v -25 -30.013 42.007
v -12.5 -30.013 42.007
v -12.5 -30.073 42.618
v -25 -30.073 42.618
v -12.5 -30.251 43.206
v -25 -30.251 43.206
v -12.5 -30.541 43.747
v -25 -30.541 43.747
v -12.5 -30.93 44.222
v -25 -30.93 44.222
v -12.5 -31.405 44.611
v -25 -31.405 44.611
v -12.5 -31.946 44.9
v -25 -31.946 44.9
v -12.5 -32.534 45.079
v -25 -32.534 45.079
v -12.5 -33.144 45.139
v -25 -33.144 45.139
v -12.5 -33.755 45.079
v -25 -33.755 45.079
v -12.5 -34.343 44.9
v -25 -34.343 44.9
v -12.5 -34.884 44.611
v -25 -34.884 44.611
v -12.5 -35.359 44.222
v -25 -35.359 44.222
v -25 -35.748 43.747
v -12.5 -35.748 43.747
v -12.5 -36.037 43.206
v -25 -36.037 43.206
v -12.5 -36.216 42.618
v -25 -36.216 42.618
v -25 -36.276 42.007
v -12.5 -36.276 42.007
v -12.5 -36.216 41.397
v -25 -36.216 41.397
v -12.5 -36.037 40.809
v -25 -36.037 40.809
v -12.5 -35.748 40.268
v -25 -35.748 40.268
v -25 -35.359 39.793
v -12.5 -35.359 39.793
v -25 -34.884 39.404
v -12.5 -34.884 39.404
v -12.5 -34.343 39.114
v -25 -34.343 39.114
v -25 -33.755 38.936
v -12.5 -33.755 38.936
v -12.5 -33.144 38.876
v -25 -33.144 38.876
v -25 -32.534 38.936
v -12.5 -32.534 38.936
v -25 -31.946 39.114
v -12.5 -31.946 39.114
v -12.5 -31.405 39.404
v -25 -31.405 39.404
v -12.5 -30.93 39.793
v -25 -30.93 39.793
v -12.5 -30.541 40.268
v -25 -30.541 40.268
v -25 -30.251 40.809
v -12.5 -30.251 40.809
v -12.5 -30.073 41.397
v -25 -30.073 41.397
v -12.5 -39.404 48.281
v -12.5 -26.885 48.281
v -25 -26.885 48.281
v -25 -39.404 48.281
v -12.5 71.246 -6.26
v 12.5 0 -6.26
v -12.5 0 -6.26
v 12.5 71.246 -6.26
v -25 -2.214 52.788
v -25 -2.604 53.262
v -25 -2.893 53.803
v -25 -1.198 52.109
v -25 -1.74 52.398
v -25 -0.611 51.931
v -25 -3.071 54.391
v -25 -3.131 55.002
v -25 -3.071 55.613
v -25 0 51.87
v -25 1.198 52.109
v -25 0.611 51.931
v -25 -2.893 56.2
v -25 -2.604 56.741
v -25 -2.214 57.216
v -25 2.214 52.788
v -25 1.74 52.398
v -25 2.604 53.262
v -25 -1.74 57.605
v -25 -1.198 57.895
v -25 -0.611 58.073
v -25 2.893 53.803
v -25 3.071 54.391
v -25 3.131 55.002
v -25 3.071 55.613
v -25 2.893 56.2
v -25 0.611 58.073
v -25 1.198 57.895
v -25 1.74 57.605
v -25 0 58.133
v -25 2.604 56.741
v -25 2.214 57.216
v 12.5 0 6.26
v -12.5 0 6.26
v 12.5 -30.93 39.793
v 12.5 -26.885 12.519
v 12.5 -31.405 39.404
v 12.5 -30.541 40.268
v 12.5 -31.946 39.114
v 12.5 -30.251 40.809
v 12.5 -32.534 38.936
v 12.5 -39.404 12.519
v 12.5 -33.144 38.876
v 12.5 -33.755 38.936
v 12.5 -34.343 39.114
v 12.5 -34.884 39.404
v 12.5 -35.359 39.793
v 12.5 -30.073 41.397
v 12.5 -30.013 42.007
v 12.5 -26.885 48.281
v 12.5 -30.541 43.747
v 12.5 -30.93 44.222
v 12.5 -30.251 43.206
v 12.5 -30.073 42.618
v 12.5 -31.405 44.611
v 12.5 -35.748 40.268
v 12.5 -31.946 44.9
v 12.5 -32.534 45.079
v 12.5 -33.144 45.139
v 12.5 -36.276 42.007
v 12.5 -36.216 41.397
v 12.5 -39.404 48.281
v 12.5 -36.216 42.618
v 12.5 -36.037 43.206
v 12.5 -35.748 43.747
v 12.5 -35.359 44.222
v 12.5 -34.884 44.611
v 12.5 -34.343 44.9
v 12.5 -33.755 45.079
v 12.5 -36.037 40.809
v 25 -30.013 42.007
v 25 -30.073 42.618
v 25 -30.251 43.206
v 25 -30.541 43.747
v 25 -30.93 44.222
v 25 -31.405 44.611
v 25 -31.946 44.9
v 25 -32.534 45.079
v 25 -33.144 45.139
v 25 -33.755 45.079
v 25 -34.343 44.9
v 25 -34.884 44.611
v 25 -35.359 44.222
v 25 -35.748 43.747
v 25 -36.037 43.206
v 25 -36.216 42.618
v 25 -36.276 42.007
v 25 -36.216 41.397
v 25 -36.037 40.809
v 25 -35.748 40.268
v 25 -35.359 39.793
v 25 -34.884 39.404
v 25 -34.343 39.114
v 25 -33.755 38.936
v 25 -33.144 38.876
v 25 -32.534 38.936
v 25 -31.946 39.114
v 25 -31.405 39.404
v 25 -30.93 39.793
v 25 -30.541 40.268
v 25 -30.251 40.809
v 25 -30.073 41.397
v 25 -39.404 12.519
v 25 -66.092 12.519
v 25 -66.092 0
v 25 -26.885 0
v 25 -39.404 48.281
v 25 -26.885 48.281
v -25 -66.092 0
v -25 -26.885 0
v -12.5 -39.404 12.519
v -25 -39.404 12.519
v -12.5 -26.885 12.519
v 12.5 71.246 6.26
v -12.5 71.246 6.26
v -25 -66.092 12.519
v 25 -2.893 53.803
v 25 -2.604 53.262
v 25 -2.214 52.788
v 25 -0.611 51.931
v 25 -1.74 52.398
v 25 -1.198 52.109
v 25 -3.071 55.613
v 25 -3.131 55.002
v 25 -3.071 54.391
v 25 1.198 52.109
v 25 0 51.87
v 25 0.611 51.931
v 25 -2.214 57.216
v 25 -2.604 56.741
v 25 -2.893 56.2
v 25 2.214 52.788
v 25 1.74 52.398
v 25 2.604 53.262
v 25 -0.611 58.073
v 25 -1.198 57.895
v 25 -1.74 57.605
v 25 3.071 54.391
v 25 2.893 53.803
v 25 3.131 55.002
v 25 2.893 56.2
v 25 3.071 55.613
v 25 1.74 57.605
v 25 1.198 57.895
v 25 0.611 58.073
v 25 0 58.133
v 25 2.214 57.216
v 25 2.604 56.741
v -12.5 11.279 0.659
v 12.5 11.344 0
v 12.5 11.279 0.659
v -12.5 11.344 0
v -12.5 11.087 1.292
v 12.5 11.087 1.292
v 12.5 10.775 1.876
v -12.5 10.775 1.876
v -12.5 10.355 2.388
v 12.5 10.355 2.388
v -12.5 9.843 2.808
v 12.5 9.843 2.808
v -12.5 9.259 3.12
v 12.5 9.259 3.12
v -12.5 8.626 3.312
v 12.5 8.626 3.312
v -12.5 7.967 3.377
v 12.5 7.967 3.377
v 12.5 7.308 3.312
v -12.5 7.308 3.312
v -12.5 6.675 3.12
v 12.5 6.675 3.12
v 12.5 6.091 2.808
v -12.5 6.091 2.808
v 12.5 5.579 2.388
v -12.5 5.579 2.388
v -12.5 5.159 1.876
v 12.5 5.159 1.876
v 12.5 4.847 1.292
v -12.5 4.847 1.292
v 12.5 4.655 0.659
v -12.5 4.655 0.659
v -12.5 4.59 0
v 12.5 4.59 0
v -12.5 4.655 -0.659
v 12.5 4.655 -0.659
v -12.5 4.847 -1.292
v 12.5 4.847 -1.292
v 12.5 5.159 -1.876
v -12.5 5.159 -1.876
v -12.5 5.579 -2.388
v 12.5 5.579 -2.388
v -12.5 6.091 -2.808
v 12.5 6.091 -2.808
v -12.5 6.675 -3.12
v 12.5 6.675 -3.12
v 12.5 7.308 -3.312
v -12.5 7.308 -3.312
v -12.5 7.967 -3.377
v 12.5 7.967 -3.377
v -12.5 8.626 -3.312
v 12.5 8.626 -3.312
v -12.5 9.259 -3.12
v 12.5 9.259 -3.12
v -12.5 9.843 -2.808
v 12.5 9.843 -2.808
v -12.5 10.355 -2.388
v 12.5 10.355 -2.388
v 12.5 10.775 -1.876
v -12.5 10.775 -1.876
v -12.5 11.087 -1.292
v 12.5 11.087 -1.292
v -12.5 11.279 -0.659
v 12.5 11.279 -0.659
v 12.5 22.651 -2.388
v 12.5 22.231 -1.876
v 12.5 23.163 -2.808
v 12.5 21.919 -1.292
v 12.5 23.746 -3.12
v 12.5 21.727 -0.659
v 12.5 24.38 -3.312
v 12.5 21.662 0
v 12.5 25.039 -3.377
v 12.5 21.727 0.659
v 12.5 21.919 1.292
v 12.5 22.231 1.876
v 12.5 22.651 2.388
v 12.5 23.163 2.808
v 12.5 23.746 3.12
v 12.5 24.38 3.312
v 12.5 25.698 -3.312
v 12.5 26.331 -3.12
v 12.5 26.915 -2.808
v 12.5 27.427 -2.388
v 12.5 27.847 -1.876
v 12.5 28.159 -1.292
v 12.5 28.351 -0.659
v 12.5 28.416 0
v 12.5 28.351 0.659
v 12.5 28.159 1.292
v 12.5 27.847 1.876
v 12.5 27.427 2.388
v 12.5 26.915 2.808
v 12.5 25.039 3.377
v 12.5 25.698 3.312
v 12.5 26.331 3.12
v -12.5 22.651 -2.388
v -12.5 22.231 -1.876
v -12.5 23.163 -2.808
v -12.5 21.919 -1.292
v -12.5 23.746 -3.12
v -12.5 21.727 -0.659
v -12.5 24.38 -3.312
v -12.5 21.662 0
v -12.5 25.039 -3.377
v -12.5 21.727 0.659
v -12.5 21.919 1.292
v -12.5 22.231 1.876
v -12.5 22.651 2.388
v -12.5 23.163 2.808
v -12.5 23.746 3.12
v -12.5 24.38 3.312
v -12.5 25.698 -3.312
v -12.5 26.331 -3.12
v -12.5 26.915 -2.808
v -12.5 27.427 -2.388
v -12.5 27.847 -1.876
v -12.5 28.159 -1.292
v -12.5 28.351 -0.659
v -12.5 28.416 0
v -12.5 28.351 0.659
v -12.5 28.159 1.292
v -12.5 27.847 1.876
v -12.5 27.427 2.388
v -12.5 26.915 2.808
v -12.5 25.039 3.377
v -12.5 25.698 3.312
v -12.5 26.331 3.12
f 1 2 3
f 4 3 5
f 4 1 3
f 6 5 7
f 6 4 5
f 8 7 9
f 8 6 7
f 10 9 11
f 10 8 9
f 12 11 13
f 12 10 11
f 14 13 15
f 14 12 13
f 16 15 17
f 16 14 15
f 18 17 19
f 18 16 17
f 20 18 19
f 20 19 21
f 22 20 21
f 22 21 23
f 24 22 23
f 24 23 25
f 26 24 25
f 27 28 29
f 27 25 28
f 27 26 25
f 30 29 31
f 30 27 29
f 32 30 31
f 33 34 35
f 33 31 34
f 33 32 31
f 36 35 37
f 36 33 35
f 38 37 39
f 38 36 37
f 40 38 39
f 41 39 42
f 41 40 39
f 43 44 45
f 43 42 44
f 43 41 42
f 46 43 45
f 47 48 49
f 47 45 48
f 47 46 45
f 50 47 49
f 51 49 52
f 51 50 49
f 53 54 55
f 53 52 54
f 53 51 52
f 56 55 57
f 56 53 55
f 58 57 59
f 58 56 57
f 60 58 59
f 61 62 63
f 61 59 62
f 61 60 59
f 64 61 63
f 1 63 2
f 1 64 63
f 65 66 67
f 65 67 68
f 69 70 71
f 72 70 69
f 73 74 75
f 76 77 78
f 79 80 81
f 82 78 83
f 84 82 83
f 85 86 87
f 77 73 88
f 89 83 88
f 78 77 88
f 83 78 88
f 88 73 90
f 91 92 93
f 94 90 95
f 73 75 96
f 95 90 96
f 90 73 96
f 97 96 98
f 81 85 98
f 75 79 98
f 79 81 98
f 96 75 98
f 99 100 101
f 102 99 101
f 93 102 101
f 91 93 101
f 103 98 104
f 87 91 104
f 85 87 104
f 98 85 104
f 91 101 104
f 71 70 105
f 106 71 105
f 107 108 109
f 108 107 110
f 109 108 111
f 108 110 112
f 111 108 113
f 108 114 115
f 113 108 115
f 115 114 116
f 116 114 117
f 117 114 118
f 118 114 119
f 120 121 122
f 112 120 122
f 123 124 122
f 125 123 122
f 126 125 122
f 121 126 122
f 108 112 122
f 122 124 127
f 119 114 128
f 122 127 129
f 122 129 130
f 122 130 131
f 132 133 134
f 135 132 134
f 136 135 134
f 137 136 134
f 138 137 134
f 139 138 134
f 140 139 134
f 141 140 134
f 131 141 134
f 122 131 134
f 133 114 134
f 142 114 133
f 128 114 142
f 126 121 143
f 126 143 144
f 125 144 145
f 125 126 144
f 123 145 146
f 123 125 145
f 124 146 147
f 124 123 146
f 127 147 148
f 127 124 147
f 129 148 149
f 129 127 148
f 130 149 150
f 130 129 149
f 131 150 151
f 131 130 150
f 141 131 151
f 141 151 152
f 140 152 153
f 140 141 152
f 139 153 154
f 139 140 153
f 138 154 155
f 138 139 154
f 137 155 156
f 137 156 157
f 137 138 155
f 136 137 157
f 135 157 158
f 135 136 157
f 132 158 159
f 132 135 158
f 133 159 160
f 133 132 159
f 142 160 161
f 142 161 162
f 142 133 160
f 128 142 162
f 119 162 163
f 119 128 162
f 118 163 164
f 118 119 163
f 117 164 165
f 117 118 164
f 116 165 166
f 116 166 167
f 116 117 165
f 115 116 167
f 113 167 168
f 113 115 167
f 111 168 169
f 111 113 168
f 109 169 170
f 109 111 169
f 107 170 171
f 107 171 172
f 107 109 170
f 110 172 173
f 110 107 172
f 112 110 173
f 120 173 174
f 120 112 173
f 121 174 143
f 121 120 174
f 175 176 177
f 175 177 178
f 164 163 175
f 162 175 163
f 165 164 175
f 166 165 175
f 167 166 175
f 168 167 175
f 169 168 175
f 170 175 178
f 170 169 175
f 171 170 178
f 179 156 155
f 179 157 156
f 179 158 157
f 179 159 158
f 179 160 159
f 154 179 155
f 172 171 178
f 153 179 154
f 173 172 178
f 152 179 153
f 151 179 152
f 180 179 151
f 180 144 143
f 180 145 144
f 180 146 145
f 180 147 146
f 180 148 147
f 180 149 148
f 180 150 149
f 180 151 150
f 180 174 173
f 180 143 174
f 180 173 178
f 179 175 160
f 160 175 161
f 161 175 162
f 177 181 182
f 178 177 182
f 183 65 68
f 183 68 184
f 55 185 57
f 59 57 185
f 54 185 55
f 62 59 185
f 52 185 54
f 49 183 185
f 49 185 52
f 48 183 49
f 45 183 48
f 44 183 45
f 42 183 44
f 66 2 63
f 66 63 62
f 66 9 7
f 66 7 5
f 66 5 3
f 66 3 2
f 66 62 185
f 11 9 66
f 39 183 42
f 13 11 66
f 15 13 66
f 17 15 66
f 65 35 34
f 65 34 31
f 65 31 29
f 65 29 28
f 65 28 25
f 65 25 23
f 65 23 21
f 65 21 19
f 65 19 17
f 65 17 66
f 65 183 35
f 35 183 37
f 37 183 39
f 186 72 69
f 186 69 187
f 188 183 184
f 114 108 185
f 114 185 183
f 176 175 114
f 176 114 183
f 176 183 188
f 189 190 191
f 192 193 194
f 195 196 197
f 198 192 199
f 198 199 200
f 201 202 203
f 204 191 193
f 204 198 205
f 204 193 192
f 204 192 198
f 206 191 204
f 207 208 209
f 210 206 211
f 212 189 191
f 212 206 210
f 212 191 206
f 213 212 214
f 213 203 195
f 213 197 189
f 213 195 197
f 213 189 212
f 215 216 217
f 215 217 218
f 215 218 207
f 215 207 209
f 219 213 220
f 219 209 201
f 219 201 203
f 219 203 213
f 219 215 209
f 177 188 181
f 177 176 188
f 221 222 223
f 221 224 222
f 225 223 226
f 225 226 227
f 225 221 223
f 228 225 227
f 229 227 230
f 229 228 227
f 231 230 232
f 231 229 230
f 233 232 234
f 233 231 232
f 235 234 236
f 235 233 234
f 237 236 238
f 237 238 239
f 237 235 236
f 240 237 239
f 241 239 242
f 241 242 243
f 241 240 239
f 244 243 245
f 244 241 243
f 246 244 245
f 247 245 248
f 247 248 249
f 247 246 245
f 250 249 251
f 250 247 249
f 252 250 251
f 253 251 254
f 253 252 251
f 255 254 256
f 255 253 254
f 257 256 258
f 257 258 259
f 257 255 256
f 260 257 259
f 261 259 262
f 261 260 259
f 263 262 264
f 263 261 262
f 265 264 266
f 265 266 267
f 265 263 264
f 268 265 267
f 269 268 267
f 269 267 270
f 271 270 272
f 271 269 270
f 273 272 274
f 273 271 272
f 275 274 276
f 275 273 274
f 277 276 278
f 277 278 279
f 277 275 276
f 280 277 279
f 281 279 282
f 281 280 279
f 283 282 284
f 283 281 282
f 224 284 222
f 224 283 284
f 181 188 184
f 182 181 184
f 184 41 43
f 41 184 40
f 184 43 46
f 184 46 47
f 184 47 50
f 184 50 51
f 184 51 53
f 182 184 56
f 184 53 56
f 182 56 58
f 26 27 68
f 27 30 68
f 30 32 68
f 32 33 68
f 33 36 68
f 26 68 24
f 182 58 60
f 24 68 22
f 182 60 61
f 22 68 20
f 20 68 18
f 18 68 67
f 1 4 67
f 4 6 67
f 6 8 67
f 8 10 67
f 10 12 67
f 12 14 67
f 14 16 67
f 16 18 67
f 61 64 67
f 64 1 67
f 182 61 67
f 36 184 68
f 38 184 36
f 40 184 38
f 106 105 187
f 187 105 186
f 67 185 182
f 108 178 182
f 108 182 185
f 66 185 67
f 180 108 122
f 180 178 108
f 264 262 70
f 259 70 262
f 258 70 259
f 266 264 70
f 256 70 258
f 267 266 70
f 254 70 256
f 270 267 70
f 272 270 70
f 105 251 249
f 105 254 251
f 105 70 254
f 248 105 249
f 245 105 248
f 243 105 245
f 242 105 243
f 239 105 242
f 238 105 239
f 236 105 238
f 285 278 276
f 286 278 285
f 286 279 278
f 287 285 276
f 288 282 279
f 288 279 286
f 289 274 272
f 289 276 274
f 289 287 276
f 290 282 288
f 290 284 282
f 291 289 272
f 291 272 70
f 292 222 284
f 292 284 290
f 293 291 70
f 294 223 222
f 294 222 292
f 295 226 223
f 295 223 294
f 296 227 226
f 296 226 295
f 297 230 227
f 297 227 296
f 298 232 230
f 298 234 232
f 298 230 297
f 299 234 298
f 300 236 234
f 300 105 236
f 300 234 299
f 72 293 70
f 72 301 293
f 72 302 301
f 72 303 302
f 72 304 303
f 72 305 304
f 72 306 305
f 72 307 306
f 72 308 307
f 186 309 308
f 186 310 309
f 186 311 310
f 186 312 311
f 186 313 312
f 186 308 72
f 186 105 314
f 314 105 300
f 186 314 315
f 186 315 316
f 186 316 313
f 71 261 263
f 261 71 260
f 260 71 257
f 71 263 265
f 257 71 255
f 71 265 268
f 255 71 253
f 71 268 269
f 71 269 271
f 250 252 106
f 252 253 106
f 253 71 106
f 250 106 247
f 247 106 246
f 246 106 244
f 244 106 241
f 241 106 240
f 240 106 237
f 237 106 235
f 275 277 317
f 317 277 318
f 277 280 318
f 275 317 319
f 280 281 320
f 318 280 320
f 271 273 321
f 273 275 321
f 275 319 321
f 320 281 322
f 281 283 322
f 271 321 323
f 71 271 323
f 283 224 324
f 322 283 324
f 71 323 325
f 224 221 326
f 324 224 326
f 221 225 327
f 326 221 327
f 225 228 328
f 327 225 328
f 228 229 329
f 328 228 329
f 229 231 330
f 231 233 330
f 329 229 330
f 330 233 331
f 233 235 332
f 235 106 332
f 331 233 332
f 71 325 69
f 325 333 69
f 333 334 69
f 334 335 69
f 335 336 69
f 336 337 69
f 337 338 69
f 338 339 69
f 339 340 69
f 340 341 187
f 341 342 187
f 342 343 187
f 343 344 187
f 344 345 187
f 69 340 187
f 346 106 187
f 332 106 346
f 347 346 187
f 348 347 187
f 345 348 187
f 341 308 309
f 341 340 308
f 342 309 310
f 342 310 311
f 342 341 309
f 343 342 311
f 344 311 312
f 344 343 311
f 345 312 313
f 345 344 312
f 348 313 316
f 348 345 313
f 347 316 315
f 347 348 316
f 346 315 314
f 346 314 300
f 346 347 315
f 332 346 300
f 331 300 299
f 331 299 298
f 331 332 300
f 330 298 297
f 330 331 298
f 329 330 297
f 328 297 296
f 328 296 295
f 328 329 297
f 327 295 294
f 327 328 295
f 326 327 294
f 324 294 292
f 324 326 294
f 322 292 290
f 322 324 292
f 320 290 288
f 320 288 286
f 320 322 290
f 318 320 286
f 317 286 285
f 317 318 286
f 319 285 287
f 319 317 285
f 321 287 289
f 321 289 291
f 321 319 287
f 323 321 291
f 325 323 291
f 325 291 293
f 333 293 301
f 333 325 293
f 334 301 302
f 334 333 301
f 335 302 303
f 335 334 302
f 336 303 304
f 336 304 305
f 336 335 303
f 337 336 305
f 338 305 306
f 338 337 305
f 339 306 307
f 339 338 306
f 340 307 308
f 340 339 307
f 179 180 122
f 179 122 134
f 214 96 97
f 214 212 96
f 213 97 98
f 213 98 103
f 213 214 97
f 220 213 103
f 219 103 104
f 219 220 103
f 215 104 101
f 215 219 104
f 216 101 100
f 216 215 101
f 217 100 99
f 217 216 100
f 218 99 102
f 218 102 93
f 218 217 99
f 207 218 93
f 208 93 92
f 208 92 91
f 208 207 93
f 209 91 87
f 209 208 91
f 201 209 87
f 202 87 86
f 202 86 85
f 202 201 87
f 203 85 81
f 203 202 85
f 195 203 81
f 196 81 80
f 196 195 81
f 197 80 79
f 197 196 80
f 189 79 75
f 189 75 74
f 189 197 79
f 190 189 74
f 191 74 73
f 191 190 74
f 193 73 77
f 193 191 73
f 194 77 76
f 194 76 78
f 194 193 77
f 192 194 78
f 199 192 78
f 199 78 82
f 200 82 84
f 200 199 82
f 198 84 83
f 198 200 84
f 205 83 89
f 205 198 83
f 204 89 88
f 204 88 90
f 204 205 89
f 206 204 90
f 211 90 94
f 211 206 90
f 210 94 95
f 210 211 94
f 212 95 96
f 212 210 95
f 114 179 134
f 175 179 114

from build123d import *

# Parameters (mm, degrees)
F0_W     = 71.2464526296
F0_H     = 12.5193465501
F0_R     = 3.3769848897
F1_DEPTH = 12.5
F2_R     = 3.1313890556
F3_DEPTH = 25
F4_W     = 25
F4_H     = 35.7612390071
F5_DEPTH = 110.6515803764
F6_R     = 3.1313890556
F7_DEPTH = 25


with BuildPart() as f1:
    # F0 (on Right) → F1 (new body, symmetric)
    with BuildSketch(Plane.YZ):
        with Locations((35.6232263148, 0)):
            Rectangle(F0_W, F0_H)
        with Locations((7.9668546095, 0)):
            Circle(F0_R, mode=Mode.SUBTRACT)
        with Locations((25.0386893749, 0)):
            Circle(F0_R, mode=Mode.SUBTRACT)
    extrude(amount=F1_DEPTH, both=True)


with BuildPart() as f3:
    # F2 (on Right) → F3 (new body, symmetric)
    with BuildSketch(Plane.YZ):
        Polygon((-66.0917535424, 12.5193465501), (-66.0917535424, 0), (-26.8847811967, 0), (-26.8847811967, 48.2805855572), (-39.4041277468, 48.2805855572), (-39.4041277468, 12.5193465501), align=None)
        with Locations((-33.1444544718, 42.0074723661)):
            Circle(F2_R, mode=Mode.SUBTRACT)
    extrude(amount=F3_DEPTH, both=True)

    # F4 (on face) → F5 (cut, through all)
    with BuildSketch(Plane.XZ.offset(39.4041277468)):
        with Locations((0, 30.3999660537)):
            Rectangle(F4_W, F4_H)
    extrude(amount=-F5_DEPTH, mode=Mode.SUBTRACT)


with BuildPart() as f7:
    # F6 (on Right) → F7 (new body, symmetric)
    with BuildSketch(Plane.YZ):
        with Locations((0, 55.001784116)):
            Circle(F6_R)
    extrude(amount=F7_DEPTH, both=True)


solid = Compound([f1.part, f3.part, f7.part])
